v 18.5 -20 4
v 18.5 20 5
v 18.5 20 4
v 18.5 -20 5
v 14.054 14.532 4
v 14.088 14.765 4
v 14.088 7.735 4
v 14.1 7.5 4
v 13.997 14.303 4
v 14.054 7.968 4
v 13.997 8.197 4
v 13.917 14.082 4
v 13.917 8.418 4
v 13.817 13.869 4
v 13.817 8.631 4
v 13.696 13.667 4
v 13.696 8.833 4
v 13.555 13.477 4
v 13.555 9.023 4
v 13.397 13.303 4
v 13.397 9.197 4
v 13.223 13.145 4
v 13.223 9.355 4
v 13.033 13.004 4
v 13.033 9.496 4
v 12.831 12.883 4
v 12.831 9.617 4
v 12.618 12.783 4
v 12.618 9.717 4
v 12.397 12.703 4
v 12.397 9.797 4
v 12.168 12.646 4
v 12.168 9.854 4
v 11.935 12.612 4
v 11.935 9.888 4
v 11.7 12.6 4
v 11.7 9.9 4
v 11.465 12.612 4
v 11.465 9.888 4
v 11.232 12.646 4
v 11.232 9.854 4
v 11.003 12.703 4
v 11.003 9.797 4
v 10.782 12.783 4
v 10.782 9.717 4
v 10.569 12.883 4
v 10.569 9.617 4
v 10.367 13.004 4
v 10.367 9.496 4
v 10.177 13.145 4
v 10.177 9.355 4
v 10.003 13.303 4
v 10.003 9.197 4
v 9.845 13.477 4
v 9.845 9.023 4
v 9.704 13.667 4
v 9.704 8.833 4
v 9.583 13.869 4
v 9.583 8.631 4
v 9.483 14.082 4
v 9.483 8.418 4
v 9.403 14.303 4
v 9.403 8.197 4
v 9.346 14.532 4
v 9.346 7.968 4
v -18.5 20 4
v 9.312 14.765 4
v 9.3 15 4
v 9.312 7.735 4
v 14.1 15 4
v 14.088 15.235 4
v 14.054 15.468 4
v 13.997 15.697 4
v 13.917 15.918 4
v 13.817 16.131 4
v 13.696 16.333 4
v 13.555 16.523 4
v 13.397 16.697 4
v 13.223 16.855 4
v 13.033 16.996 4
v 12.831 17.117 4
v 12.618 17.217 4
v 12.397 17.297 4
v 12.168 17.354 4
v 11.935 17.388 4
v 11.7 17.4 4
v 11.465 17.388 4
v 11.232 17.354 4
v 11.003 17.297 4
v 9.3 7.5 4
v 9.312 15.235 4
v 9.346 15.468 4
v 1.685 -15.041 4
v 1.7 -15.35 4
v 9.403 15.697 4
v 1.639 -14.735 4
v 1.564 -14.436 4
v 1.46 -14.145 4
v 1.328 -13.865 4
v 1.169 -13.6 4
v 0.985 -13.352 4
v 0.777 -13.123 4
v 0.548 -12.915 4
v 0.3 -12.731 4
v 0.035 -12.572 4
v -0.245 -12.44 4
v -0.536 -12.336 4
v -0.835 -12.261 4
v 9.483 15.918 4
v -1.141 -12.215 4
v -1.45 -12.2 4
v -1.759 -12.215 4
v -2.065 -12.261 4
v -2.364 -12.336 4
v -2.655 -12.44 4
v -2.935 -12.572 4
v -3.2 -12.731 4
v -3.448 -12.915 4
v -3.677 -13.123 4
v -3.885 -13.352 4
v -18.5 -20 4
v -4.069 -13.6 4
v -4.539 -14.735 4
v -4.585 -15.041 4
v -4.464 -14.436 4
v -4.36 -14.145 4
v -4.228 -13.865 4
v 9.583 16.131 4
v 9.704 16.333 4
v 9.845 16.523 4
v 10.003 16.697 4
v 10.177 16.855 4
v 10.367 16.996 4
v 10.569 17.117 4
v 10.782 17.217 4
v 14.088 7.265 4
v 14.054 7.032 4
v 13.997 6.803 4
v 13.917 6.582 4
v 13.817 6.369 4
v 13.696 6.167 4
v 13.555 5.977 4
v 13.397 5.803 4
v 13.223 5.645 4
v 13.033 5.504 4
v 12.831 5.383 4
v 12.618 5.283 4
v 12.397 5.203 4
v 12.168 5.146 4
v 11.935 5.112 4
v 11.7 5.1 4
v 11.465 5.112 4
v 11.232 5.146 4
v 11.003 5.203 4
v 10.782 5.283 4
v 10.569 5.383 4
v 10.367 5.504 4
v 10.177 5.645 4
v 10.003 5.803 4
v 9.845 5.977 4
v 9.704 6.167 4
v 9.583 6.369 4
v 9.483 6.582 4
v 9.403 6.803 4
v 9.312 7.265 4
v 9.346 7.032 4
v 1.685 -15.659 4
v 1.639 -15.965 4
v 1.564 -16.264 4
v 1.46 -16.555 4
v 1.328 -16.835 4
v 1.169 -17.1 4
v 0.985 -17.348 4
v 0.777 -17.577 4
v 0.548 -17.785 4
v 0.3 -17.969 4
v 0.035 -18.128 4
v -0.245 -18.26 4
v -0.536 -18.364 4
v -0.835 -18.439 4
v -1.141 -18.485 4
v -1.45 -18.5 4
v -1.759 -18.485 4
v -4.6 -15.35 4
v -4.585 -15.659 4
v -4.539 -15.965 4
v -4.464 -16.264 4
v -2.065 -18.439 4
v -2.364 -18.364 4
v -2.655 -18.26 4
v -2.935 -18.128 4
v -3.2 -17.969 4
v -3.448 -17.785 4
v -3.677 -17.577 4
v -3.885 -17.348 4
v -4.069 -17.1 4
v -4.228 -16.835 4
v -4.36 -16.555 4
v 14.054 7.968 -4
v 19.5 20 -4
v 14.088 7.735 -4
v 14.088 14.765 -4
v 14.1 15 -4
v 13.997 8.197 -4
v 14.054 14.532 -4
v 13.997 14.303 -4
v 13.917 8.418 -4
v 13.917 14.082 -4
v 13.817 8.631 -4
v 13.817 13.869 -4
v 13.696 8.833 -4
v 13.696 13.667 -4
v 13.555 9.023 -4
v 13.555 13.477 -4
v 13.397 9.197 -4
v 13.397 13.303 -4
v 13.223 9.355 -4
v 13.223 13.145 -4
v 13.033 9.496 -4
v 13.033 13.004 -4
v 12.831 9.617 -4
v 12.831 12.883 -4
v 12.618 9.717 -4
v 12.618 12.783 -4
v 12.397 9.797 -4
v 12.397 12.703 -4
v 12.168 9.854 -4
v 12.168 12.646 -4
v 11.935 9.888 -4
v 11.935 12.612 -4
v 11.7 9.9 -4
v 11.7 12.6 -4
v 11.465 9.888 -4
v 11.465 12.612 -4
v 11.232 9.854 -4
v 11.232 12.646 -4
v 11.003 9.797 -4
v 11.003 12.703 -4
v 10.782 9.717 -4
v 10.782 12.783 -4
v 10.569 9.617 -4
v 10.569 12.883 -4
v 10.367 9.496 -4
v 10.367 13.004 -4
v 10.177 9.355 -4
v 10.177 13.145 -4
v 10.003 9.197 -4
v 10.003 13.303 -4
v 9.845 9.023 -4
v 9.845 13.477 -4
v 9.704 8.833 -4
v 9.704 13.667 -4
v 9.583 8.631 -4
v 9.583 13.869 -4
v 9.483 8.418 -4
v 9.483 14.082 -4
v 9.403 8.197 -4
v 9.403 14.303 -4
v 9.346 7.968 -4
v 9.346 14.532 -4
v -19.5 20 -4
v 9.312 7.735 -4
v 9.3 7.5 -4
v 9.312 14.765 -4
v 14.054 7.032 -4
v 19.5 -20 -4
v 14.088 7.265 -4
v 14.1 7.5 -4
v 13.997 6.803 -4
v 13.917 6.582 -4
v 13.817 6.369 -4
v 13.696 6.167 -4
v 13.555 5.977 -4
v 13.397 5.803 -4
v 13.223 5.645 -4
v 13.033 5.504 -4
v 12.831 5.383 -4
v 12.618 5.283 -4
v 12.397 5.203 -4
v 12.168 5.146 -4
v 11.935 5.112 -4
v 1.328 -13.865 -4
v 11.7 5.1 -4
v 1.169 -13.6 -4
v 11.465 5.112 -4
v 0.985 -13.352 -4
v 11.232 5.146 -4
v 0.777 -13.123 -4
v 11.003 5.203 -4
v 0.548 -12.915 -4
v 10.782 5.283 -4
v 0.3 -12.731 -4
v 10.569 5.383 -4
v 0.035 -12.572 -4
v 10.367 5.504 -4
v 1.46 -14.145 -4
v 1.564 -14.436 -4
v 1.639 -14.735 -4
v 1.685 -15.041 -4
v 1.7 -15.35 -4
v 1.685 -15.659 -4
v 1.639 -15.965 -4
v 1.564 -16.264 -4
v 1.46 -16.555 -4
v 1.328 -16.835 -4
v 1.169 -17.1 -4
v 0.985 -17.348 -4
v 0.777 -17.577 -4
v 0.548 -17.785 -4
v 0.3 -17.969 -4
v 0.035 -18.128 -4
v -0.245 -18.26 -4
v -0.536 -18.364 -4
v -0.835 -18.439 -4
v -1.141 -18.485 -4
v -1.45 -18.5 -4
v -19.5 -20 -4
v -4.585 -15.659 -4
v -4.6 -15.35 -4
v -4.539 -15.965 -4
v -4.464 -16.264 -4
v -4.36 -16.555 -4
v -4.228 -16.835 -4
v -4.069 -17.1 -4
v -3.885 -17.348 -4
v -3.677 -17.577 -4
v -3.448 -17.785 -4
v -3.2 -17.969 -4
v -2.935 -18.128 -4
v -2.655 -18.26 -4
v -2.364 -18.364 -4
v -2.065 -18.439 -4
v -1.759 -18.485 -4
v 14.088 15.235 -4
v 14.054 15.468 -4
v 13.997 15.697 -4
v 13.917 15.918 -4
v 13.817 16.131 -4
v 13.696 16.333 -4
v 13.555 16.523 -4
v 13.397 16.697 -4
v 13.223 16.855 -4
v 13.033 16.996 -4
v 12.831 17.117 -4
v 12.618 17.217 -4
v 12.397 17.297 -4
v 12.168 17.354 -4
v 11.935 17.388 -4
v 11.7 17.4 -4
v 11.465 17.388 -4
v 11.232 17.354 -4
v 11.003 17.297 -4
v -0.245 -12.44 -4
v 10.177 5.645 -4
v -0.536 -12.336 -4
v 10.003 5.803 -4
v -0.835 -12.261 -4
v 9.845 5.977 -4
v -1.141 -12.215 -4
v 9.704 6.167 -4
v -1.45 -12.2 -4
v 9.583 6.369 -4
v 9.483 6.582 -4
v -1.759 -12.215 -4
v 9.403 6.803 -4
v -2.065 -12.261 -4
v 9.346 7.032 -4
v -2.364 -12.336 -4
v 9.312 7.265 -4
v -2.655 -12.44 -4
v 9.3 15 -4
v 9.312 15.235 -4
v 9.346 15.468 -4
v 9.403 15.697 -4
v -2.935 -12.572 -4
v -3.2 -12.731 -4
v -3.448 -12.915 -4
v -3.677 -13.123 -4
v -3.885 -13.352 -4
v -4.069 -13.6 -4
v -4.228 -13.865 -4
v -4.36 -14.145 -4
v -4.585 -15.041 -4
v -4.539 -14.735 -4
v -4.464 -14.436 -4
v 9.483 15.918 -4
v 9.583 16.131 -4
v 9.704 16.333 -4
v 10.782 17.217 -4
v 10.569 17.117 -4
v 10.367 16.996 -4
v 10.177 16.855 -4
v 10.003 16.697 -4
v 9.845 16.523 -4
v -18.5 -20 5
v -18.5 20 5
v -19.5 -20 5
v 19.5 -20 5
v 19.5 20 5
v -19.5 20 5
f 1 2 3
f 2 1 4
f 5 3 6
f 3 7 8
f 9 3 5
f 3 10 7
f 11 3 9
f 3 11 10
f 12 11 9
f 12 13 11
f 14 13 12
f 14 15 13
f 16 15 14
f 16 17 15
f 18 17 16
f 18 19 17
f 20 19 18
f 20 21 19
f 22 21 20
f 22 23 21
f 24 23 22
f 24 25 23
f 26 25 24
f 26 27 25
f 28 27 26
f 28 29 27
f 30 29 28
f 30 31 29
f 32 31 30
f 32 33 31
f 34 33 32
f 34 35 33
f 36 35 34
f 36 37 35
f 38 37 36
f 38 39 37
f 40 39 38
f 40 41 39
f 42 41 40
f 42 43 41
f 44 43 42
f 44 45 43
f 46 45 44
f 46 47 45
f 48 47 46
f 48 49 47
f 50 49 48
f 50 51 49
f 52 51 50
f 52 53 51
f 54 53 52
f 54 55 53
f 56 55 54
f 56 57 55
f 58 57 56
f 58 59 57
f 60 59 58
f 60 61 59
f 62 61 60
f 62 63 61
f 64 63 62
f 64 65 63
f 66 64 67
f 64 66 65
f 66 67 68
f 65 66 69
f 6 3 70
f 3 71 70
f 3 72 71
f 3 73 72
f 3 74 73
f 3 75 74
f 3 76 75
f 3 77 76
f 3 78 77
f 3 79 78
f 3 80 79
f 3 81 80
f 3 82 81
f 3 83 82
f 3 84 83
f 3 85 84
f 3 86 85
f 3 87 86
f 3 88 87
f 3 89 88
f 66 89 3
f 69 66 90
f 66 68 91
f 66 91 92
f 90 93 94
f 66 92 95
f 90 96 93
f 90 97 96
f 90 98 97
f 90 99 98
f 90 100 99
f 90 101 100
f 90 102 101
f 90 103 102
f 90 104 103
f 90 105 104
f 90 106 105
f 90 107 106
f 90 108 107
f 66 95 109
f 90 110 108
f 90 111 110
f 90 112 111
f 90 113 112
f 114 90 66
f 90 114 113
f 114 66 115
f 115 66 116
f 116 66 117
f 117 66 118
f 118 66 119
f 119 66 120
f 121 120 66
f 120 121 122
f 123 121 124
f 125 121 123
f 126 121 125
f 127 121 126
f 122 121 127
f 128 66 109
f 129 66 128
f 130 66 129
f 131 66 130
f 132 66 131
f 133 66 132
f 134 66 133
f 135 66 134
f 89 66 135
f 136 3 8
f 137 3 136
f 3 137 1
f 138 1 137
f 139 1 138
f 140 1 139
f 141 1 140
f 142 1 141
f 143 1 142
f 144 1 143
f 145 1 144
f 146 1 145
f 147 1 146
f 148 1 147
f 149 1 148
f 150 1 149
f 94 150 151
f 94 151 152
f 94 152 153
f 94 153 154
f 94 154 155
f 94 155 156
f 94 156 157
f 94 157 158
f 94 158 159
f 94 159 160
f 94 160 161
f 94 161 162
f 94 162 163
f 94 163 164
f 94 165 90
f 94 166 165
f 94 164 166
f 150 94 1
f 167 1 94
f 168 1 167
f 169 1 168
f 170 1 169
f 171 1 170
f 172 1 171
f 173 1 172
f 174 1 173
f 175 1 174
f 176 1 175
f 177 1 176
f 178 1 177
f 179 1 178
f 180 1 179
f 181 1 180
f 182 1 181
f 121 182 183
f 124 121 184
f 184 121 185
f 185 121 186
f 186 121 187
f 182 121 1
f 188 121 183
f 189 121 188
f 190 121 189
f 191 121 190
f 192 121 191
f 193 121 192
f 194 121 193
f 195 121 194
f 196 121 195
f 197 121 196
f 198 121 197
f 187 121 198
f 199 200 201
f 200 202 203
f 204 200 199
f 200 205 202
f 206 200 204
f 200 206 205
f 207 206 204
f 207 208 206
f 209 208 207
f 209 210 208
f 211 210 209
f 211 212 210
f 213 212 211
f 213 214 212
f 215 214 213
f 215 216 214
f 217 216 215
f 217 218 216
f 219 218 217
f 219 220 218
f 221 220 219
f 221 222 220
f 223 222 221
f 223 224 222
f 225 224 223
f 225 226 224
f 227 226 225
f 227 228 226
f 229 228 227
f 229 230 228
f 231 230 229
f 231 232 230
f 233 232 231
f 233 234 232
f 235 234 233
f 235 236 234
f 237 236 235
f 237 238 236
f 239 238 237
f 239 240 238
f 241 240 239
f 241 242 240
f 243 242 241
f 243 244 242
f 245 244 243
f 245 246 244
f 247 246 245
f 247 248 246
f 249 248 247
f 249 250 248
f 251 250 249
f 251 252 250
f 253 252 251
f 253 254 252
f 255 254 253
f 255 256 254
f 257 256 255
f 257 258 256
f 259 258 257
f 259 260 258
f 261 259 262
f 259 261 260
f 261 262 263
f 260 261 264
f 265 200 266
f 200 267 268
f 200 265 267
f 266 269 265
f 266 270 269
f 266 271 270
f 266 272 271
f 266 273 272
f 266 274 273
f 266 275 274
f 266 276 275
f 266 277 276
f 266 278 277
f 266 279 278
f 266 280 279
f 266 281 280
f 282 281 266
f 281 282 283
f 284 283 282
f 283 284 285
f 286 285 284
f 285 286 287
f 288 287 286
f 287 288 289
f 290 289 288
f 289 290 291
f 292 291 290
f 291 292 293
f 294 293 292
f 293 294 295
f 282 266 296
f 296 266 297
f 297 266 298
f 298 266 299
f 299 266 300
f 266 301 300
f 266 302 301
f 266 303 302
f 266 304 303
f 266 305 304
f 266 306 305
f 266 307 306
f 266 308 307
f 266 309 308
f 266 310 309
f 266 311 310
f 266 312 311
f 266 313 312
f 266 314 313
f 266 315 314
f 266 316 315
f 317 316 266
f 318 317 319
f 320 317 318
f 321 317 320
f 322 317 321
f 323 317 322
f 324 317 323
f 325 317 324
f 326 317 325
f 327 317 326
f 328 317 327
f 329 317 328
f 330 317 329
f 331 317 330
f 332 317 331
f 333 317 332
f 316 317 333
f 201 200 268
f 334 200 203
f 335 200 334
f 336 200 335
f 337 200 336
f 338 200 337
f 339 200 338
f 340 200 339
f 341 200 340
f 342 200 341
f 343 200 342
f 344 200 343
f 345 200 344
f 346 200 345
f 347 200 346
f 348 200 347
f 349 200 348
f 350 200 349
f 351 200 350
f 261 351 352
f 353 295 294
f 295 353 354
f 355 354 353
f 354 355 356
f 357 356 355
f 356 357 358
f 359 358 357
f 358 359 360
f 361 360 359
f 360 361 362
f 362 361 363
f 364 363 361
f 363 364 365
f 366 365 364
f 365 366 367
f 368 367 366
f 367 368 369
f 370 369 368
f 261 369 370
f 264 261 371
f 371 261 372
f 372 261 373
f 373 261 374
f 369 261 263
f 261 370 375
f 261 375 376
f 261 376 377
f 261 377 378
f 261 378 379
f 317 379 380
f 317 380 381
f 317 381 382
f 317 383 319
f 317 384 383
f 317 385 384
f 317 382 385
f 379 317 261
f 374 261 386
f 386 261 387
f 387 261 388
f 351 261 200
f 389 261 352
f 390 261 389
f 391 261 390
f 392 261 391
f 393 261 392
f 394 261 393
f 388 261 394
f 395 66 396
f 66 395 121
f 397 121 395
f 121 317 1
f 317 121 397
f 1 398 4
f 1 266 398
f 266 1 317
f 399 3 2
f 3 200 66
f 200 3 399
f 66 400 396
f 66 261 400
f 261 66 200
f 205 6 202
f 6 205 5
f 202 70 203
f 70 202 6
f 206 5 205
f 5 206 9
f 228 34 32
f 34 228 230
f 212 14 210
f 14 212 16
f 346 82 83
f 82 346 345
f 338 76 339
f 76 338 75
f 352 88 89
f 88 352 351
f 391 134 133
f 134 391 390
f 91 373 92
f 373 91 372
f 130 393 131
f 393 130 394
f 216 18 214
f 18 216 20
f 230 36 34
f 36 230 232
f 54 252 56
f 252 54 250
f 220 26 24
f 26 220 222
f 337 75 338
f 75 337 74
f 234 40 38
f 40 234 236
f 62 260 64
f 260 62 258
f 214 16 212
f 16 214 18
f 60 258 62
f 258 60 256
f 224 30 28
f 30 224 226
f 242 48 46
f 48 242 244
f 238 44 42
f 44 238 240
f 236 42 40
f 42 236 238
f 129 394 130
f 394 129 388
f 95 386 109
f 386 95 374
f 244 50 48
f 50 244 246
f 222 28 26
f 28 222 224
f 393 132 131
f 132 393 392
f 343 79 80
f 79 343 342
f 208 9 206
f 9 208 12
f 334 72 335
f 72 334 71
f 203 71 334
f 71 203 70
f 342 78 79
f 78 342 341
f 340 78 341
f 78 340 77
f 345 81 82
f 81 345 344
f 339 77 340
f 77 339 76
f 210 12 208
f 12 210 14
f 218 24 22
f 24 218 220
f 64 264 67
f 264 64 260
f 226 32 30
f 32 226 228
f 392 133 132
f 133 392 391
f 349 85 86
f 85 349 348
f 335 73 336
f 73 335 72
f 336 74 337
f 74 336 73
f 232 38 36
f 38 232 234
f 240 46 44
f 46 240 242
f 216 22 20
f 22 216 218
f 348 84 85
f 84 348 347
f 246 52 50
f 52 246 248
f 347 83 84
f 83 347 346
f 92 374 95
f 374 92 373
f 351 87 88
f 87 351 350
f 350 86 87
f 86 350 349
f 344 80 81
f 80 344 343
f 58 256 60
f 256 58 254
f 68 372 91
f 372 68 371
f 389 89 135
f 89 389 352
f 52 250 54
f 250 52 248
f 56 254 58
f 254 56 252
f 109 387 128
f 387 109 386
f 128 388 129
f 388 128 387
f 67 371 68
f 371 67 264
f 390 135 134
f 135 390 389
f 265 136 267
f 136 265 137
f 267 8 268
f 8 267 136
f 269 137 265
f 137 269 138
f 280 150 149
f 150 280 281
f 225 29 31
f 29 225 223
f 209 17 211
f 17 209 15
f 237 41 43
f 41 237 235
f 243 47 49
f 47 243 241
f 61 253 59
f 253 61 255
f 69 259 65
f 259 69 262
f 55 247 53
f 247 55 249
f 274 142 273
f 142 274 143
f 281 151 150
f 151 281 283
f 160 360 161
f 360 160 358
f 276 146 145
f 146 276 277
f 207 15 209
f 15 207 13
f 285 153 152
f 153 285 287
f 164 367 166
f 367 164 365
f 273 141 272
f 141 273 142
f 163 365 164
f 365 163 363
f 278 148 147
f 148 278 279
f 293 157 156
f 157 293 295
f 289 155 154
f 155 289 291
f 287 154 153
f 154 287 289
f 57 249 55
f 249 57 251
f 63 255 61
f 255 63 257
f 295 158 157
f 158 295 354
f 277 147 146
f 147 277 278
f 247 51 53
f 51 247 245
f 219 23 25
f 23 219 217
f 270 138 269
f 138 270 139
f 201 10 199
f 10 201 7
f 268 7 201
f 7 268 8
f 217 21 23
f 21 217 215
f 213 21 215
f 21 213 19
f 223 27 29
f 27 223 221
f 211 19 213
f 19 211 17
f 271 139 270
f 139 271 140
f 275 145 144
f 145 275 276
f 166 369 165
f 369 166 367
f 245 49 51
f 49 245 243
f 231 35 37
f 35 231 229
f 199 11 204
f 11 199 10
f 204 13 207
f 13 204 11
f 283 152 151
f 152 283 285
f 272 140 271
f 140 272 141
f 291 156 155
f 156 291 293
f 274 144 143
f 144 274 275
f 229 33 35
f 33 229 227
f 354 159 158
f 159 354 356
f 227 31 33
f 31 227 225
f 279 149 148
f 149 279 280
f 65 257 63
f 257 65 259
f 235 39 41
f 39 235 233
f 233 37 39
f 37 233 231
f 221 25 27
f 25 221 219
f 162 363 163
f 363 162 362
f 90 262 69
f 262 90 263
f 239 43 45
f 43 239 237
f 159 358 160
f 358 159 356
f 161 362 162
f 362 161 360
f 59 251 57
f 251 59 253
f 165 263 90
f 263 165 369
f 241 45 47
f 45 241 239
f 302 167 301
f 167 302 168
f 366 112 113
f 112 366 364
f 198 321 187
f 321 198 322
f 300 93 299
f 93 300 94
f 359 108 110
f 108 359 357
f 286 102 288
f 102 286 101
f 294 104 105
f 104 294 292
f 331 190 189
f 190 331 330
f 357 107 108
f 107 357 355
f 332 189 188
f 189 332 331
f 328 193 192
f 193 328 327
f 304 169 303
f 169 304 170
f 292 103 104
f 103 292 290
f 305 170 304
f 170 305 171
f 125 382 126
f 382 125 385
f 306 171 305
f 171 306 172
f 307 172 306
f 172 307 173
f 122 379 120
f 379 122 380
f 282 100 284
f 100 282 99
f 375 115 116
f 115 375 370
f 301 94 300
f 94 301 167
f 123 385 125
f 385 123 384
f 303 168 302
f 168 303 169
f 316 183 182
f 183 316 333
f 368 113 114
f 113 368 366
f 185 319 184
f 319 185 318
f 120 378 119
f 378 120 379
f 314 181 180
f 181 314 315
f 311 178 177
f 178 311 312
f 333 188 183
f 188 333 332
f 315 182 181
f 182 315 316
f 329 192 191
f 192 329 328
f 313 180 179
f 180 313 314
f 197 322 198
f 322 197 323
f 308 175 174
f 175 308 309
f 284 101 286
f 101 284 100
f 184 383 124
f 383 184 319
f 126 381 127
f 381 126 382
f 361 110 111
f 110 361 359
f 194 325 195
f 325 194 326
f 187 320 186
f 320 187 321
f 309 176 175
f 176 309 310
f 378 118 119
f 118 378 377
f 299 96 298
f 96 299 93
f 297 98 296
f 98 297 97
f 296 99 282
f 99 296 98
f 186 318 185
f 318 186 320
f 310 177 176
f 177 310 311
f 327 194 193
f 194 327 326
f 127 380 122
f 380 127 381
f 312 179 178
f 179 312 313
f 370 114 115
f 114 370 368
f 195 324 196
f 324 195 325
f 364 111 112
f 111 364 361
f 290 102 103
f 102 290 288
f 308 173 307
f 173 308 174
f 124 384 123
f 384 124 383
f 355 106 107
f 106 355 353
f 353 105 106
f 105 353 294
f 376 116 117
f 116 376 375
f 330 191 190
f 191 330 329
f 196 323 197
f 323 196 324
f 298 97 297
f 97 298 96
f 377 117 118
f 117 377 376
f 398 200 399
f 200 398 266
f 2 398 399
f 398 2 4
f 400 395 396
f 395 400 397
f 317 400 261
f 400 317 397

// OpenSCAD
// file: FReverbuilt.scad
railX=37.0;
railY=40;
railZ=8;
holeD=4.8;
holeX=railX/2-6.8;
hole1Y=-railY/2+5;
hole2Y=-railY/2+12.5;
frameThickness=1;

guardholeD=6.3;
guardholeX=railX/2-(16.8+guardholeD/2);
guardholeY=-railY/2+(32.2+guardholeD/2);

module FReverbuilt()
{
difference() {
    cube([railX,railY,railZ],center=true);
    translate([holeX,hole1Y,0])cylinder(d=holeD,h=railZ+0.01,$fn=64,center=true);
    translate([holeX,hole2Y,0])cylinder(d=holeD,h=railZ+0.01,$fn=64,center=true);
    translate([guardholeX,guardholeY,0])cylinder(d=guardholeD,h=railZ+0.01,$fn=64,center=true);
}

//Frame
translate([railX/2+frameThickness/2,0,frameThickness/2])cube([frameThickness,railY,railZ+frameThickness],center=true);
translate([-railX/2-frameThickness/2,0,frameThickness/2])cube([frameThickness,railY,railZ+frameThickness],center=true);

}

FReverbuilt();
// main file
use <FReverbuilt.scad>

rotate([180,0,0])mirror([0,0,1])FReverbuilt();
